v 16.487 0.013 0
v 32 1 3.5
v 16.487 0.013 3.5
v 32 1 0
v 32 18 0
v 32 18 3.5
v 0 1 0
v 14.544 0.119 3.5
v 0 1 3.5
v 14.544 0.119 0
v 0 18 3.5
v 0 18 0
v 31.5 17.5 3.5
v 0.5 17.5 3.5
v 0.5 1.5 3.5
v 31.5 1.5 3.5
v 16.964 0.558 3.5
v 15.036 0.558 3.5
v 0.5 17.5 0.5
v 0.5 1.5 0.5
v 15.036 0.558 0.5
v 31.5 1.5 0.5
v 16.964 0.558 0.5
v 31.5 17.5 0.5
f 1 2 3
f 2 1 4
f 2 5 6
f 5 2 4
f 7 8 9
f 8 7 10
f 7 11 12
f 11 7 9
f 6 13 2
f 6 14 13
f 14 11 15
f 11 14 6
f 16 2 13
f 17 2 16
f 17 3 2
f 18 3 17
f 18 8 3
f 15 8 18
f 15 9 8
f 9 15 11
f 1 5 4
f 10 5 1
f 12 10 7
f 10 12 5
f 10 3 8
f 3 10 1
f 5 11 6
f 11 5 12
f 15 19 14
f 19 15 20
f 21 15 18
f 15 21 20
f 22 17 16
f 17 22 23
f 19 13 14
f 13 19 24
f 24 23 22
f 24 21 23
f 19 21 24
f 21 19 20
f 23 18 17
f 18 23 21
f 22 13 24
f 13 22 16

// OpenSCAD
// Cover for a ThinkPad USB keyboard Caps Lock key
//
//  I'M SICK OF ALL CAPS HAPPENING BY ACCIDENT!


difference(){
    hull(){   //outside of caps lock key cover
        translate([0,1,0]) cube([32,17,3.5]);
        translate([16,9,0]) cylinder(3.5,9,9);
    }
    hull(){   //inside of caps lock key cover
        translate([0.5,1.5,0.5]) cube([31,16,3]);
        translate([16,8.5,0.5]) cylinder(3,8,8);
    }
} 
